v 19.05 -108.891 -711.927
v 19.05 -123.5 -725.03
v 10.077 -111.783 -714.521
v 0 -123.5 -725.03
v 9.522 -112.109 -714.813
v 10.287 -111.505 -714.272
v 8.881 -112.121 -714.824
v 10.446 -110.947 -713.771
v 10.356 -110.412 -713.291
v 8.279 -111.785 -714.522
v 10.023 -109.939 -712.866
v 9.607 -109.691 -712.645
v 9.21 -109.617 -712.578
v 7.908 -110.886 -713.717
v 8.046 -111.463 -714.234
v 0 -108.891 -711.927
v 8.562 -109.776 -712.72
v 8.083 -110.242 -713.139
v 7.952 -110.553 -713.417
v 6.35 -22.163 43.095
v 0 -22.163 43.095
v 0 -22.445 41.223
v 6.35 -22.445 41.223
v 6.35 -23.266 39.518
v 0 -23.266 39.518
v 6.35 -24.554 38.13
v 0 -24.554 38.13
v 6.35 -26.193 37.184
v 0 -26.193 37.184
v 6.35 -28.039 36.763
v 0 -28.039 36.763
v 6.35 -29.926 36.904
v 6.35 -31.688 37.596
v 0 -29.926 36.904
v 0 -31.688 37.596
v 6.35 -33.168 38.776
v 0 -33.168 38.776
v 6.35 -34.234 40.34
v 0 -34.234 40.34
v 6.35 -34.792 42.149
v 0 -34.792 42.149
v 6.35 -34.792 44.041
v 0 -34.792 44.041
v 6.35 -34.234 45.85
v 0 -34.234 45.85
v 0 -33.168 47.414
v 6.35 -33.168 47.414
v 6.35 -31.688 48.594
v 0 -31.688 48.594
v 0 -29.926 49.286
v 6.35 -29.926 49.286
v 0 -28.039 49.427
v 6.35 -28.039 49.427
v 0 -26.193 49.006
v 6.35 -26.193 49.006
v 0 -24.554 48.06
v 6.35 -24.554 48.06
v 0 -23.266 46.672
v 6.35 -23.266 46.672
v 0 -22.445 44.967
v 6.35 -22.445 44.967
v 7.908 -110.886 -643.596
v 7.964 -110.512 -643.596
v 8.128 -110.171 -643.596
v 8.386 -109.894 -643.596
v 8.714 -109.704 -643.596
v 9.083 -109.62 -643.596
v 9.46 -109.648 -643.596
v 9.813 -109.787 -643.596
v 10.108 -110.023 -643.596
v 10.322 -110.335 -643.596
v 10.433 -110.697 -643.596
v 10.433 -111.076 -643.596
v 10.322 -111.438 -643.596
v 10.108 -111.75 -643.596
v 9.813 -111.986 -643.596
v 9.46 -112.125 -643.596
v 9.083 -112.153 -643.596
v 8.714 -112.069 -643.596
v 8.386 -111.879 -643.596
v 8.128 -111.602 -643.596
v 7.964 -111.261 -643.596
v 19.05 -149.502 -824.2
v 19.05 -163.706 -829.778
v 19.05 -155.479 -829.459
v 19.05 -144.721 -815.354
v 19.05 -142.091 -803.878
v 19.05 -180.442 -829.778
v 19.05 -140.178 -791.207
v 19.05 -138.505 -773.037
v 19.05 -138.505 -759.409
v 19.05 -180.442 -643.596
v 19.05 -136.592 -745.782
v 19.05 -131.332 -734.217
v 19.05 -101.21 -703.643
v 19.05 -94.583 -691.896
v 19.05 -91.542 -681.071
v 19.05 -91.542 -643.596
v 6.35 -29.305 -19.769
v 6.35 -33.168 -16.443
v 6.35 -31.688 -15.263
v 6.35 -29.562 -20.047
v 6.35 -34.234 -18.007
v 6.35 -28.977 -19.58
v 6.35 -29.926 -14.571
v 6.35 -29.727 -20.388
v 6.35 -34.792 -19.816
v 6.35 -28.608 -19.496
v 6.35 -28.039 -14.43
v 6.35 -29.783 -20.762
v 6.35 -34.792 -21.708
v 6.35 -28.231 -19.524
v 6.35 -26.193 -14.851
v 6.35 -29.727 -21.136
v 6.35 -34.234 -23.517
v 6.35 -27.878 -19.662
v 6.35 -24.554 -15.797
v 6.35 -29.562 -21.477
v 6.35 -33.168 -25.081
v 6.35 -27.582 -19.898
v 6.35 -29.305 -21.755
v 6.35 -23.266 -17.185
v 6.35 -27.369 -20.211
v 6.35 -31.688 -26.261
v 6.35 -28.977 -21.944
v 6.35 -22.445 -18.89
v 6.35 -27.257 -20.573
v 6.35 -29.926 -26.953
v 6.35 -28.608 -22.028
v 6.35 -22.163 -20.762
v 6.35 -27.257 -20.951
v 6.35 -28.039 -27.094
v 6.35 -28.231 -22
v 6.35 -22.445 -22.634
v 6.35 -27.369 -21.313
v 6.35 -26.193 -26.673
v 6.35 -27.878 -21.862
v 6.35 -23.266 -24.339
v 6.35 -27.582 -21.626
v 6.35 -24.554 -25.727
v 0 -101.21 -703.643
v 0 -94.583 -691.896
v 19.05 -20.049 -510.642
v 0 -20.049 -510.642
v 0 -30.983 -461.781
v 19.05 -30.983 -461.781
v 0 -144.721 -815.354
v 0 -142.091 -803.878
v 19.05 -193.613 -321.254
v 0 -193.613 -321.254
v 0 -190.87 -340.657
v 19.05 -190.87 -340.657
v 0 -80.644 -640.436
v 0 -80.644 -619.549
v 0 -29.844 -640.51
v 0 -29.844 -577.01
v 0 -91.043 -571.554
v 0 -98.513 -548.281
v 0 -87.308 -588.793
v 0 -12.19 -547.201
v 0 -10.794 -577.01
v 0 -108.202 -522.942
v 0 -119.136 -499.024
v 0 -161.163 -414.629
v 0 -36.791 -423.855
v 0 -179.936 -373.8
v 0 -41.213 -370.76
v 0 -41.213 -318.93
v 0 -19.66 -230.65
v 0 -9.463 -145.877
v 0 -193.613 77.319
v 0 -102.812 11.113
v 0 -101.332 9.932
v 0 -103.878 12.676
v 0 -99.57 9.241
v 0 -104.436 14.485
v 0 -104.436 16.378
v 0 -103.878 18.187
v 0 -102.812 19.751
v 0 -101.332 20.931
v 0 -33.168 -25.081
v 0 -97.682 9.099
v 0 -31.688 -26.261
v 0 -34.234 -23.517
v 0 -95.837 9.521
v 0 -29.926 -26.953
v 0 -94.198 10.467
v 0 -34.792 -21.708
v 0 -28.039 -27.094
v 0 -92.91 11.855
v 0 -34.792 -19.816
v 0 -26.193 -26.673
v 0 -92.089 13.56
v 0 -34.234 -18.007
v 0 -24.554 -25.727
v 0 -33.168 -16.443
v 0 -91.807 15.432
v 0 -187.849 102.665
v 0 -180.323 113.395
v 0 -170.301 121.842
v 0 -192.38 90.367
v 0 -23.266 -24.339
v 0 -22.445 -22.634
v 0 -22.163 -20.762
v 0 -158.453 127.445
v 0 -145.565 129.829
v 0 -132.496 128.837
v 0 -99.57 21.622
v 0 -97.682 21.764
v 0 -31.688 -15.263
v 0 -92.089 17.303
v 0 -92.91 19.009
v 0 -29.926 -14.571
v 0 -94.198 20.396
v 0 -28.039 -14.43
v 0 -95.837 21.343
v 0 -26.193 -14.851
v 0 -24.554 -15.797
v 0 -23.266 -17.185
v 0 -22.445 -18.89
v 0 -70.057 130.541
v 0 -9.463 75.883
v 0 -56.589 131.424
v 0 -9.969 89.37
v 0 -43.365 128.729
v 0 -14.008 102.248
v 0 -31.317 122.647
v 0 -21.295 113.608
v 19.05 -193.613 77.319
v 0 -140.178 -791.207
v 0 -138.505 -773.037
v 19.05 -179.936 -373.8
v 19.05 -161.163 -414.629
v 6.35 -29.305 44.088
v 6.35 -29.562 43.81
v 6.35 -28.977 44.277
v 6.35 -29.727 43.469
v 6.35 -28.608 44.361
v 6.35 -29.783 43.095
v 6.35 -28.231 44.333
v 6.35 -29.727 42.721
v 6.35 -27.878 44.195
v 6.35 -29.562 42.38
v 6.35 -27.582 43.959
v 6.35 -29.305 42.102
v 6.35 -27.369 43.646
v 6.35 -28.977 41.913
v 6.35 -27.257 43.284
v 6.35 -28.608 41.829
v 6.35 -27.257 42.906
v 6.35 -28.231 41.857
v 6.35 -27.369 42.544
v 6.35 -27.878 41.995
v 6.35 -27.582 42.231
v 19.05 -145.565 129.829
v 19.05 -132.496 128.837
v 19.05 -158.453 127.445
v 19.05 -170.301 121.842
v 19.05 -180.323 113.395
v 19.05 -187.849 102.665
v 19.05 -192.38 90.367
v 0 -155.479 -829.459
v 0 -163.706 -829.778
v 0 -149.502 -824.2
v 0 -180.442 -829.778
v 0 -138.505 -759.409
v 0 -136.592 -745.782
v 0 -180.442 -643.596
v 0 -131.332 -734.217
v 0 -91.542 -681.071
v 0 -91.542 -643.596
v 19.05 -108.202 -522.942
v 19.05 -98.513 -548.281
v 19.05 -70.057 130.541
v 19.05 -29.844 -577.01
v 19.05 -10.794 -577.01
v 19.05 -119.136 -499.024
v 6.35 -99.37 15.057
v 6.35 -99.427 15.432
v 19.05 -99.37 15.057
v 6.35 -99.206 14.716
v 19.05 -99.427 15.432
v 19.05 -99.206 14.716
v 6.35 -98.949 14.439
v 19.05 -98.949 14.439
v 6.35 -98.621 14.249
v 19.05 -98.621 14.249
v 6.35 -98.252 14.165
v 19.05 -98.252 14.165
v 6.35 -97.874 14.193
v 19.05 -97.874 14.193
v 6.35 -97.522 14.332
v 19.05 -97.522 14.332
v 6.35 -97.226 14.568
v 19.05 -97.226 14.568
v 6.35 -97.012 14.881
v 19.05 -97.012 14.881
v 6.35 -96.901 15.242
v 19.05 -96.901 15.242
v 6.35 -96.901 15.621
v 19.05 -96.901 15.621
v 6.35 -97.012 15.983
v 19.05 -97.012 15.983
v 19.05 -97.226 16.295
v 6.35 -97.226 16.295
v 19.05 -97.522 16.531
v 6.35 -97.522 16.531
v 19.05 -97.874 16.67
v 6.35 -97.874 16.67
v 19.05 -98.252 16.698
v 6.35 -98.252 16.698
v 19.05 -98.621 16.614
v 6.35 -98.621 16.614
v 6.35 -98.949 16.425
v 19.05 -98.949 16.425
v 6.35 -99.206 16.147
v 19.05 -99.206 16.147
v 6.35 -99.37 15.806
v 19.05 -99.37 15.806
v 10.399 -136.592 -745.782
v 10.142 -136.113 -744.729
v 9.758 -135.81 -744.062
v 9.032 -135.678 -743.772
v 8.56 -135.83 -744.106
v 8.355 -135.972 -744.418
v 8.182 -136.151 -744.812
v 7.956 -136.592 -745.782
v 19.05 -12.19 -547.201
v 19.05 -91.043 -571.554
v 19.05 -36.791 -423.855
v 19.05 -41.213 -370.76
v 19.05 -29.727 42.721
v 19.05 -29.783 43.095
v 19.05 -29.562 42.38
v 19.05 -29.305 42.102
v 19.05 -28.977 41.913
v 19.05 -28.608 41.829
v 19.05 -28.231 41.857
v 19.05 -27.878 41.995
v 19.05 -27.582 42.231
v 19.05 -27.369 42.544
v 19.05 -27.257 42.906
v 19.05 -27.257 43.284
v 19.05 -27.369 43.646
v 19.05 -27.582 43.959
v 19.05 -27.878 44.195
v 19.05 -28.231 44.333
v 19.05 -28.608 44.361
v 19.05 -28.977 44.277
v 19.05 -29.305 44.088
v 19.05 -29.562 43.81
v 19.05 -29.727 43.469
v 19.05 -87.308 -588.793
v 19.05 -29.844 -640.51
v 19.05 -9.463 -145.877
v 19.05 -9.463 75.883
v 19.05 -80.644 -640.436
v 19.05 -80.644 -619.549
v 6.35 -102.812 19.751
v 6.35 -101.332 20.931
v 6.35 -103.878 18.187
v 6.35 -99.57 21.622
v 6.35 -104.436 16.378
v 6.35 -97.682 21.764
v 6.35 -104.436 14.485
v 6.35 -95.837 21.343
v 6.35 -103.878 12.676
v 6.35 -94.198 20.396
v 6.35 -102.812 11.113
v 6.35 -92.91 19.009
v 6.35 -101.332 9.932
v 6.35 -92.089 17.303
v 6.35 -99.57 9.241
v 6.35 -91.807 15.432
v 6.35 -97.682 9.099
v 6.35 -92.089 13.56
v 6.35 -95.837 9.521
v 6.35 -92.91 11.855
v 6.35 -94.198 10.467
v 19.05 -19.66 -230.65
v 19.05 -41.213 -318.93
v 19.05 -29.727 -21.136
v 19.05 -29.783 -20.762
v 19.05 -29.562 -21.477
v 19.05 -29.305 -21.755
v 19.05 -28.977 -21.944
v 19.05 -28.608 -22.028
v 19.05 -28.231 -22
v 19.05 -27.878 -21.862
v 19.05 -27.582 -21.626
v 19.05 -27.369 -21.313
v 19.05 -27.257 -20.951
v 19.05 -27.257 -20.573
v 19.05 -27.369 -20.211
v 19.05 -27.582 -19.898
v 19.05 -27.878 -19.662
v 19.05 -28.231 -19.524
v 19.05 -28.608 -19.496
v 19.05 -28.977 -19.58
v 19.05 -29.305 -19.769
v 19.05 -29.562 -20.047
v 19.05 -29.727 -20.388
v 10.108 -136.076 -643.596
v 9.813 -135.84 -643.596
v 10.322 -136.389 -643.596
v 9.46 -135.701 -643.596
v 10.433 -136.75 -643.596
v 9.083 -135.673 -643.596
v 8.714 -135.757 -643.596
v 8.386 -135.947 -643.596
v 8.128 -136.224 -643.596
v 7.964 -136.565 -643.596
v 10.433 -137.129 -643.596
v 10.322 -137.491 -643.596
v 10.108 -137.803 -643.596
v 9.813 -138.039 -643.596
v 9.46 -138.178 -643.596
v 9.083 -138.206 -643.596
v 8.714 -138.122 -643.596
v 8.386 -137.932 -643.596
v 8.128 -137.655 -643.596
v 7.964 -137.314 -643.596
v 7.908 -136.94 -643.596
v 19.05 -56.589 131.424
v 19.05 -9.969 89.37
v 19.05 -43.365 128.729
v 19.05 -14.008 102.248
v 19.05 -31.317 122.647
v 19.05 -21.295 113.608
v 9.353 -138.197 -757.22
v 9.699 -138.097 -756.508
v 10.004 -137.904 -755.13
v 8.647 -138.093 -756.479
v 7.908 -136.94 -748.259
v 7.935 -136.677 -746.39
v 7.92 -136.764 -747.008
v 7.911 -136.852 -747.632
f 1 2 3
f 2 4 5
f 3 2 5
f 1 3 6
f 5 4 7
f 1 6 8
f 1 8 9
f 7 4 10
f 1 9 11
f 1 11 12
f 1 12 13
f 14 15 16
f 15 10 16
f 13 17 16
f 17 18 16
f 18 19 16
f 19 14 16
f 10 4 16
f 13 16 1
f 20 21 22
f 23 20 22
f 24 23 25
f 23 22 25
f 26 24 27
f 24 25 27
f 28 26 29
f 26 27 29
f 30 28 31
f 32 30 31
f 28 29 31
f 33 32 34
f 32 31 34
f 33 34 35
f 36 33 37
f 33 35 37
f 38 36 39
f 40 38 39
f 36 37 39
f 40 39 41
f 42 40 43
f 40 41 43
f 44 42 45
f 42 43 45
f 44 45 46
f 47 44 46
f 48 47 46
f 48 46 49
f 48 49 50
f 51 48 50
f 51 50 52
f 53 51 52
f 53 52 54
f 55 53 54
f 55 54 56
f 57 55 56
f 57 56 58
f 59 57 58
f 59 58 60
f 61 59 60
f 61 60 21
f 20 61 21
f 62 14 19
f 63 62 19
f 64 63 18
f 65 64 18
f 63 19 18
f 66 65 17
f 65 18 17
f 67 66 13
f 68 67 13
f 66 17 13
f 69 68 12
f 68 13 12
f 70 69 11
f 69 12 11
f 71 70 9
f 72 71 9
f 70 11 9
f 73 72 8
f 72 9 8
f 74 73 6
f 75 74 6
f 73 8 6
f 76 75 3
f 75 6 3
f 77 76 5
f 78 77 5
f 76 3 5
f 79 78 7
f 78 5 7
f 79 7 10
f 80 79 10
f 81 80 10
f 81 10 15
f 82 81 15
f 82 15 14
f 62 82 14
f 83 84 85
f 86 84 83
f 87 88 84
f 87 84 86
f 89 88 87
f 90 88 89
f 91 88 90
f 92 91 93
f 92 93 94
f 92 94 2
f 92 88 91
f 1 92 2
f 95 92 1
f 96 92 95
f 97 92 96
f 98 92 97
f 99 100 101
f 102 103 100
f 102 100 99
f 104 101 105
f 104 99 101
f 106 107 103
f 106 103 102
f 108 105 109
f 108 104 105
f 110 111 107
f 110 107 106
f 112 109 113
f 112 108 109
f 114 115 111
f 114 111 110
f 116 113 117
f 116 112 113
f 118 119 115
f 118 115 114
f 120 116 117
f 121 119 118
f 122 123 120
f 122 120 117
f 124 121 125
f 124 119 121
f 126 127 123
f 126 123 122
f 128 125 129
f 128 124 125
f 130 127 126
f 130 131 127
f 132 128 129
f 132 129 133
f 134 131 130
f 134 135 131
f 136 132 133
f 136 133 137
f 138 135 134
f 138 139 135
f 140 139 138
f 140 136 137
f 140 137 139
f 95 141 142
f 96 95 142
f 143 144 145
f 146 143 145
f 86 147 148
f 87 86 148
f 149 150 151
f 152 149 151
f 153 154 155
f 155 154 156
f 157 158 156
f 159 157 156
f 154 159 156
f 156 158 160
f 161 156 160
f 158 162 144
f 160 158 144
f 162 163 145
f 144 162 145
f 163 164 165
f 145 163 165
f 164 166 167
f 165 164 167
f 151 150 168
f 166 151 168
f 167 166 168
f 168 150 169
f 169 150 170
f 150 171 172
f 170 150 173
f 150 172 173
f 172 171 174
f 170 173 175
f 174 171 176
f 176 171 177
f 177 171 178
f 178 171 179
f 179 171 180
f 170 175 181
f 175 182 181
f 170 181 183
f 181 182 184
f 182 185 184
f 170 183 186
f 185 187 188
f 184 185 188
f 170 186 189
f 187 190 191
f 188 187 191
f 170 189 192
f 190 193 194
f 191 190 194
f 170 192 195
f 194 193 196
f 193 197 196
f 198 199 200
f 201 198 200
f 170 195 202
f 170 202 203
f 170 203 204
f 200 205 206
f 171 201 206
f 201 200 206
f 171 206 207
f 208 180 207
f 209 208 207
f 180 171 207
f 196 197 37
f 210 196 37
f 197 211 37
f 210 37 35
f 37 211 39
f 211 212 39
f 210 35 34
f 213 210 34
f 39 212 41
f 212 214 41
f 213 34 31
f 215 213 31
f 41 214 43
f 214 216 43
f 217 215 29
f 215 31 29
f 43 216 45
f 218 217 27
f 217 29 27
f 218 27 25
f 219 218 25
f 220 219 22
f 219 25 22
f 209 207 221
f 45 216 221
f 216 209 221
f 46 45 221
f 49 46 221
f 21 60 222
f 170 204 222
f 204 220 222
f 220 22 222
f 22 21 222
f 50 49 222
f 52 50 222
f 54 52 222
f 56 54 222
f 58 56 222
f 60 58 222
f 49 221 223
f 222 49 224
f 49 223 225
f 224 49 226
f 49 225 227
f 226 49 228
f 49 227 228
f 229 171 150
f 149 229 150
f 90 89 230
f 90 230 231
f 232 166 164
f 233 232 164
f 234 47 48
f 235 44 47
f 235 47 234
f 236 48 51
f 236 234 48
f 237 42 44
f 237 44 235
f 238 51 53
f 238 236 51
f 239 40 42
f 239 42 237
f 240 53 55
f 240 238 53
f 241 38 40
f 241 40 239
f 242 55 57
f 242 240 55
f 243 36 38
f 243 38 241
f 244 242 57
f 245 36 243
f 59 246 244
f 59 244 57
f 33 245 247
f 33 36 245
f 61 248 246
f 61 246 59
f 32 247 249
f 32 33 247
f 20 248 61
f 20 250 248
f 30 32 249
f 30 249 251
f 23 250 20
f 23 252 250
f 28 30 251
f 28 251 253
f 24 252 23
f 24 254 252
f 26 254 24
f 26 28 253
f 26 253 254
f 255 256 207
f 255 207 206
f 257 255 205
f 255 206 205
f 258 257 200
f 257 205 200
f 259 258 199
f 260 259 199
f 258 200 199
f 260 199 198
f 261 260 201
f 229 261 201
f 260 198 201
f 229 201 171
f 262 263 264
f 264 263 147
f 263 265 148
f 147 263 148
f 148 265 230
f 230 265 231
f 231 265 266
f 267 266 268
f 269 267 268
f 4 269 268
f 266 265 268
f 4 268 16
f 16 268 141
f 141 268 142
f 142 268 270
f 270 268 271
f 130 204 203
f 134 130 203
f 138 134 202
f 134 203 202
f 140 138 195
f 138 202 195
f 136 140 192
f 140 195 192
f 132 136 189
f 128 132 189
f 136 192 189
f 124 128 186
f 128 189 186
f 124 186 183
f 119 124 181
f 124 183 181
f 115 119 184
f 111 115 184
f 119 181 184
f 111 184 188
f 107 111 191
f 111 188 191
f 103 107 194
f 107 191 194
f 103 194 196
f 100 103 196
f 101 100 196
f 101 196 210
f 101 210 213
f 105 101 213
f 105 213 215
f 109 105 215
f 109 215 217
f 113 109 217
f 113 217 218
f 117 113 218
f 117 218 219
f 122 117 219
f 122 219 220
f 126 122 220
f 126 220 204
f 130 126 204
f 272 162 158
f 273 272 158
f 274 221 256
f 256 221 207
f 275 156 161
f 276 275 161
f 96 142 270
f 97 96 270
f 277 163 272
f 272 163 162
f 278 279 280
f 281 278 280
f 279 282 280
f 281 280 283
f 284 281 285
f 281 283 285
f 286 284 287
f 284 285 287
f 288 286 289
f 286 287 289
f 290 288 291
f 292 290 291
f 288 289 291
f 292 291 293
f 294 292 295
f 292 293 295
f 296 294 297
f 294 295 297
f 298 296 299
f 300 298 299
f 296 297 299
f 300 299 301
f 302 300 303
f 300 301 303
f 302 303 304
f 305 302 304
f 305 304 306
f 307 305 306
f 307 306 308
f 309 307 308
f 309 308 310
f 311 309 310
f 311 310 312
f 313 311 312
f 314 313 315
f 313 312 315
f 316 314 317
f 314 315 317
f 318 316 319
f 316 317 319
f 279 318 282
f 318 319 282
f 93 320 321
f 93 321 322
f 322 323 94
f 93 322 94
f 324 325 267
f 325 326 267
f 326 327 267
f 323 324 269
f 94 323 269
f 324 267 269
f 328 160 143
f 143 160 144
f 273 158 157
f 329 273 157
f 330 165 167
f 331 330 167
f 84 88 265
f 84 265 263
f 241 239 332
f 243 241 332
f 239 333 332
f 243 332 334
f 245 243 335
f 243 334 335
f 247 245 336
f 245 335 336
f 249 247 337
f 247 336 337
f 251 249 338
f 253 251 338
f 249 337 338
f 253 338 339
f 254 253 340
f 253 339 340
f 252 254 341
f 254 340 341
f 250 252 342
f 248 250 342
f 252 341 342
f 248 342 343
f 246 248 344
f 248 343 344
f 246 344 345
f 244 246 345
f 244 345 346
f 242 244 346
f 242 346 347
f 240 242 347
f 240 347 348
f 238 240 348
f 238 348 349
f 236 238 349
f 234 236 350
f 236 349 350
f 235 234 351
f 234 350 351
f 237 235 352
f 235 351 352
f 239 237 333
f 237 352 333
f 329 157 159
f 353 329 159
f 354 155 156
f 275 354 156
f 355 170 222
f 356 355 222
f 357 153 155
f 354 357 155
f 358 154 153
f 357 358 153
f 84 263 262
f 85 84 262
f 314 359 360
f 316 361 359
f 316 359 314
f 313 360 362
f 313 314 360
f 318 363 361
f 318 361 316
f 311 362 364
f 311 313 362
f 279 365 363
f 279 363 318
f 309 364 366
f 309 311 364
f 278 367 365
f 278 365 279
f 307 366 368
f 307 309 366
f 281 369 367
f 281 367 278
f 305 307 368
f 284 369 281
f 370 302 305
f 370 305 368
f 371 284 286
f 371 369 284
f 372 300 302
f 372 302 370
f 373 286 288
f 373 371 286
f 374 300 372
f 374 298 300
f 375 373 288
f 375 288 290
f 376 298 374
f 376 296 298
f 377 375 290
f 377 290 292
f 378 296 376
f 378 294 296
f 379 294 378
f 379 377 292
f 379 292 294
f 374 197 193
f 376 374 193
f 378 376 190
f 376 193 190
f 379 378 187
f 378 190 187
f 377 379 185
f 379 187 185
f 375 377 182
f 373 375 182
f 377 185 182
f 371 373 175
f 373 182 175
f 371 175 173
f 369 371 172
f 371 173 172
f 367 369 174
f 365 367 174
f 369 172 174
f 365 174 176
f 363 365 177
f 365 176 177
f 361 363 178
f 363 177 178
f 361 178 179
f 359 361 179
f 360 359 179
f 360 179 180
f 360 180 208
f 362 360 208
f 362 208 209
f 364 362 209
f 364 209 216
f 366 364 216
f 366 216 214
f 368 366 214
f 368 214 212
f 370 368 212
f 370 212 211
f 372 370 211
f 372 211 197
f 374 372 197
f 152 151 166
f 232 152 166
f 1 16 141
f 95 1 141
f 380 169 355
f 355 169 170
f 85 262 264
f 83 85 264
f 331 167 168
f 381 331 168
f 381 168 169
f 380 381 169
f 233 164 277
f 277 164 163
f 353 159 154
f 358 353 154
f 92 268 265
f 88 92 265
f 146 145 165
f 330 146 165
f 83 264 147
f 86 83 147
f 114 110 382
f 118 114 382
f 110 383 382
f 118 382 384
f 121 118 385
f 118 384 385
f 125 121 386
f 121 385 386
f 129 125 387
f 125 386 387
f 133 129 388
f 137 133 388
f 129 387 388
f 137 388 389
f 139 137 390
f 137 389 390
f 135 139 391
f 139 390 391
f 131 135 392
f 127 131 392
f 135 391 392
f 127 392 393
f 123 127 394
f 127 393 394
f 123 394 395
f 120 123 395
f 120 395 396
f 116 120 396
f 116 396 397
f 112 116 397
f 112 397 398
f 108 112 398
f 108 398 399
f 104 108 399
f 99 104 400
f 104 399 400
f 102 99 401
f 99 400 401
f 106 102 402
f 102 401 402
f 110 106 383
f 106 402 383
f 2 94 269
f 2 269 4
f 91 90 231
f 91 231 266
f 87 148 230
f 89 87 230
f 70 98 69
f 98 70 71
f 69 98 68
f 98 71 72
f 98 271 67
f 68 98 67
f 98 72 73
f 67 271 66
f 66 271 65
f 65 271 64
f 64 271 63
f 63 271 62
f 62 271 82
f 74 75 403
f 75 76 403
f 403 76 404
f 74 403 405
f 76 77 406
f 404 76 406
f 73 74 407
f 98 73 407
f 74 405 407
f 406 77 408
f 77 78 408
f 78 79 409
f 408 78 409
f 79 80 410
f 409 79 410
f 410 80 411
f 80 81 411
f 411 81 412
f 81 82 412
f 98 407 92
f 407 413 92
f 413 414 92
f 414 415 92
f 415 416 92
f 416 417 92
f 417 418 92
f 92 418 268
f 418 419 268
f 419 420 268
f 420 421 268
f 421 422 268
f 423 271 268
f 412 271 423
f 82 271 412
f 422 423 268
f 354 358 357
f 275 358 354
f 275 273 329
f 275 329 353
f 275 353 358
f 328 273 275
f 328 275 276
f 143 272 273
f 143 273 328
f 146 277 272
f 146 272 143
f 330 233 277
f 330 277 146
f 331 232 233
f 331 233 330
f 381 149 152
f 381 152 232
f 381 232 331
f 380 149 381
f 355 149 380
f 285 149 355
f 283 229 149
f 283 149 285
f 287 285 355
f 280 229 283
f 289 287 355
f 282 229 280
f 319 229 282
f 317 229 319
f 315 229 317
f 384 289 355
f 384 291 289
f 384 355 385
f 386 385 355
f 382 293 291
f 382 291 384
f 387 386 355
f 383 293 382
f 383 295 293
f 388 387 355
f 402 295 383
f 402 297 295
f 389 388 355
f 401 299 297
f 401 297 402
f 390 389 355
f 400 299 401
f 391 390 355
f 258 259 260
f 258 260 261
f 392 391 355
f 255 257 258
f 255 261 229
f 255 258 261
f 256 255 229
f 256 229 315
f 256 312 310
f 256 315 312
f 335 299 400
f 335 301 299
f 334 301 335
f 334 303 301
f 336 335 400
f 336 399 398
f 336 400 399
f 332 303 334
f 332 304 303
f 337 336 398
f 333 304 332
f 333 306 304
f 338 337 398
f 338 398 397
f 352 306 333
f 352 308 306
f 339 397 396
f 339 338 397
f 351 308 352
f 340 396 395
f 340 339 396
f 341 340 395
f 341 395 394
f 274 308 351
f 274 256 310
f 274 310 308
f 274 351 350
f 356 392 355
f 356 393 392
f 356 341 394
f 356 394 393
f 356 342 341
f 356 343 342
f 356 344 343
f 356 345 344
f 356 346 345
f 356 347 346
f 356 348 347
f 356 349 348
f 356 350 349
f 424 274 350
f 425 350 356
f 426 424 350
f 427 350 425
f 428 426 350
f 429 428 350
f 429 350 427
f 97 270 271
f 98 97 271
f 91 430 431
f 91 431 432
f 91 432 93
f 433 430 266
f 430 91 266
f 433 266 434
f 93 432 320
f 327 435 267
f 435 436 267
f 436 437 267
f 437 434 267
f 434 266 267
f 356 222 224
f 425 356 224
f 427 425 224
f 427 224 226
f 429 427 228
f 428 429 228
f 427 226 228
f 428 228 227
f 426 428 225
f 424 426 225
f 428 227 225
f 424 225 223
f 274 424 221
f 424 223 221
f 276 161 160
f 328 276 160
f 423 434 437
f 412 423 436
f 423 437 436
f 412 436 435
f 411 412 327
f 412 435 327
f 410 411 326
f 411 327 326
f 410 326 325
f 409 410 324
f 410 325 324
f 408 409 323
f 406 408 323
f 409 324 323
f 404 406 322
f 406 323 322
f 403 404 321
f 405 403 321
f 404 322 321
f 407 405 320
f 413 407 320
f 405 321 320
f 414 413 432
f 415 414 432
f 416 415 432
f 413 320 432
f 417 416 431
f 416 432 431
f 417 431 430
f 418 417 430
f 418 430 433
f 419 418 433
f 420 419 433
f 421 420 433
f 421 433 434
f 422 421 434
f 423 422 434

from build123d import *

# Parameters (mm, degrees)
F1_DEPTH       = 19.05
F3_DEPTH       = 19.05
F5_D           = 2.54
F6_D           = 2.54
F6_CBORE_D     = 12.7
F6_CBORE_DEPTH = 6.35


with BuildPart() as f1:
    # F0 (on Right) → F1 (new body)
    with BuildSketch(Plane.YZ):
        with BuildLine():
            Line((-9.4631160864, -145.8767226739), (-9.4631160864, 75.883344673))
            ThreePointArc((-9.4631160864, 75.883344673), (-26.0043887413, 118.4617737239), (-70.0568248432, 130.5414754989))
            Line((-70.0568248432, 130.5414754989), (-132.4960702221, 128.8365857415))
            ThreePointArc((-132.4960702221, 128.8365857415), (-175.5855155906, 117.9432591892), (-193.6131160864, 77.3185070558))
            Line((-193.6131160864, 77.3185070558), (-193.6131160864, 12.8251980523))
            Line((-193.6131160864, 12.8251980523), (-193.6131160864, -321.2538063526))
            Line((-193.6131160864, -321.2538063526), (-190.8701509237, -340.6569361687))
            Line((-190.8701509237, -340.6569361687), (-179.9363493919, -373.8000094891))
            Line((-179.9363493919, -373.8000094891), (-161.1630767584, -414.6291613579))
            Line((-161.1630767584, -414.6291613579), (-119.1362962127, -499.024450779))
            Line((-119.1362962127, -499.024450779), (-108.2024946809, -522.9421257973))
            Line((-108.2024946809, -522.9421257973), (-98.5129252076, -548.2812523842))
            Line((-98.5129252076, -548.2812523842), (-91.0426452756, -571.554005146))
            Line((-91.0426452756, -571.554005146), (-87.3075053096, -588.7931585312))
            Line((-87.3075053096, -588.7931585312), (-80.6437532824, -619.5490189172))
            Line((-80.6437532824, -619.5490189172), (-80.6437532824, -619.8235154152))
            Line((-80.6437532824, -619.8235154152), (-80.6437532824, -629.592359066))
            Line((-80.6437532824, -629.592359066), (-80.6437532824, -640.436412161))
            Line((-80.6437532824, -640.436412161), (-29.8438072205, -640.5104398727))
            Line((-29.8438072205, -640.5104398727), (-29.8438072205, -577.0104398727))
            Line((-29.8438072205, -577.0104398727), (-10.7938072205, -577.0104398727))
            Line((-10.7938072205, -577.0104398727), (-12.1900755912, -547.2014546394))
            Line((-12.1900755912, -547.2014546394), (-20.0487431139, -510.6415748596))
            Line((-20.0487431139, -510.6415748596), (-30.9825371951, -461.7811739445))
            Line((-30.9825371951, -461.7811739445), (-36.7911197245, -423.85455966))
            Line((-36.7911197245, -423.85455966), (-41.2131160864, -370.7598916097))
            Line((-41.2131160864, -370.7598916097), (-41.2131160864, -318.930464129))
            Line((-41.2131160864, -318.930464129), (-19.6600593626, -230.6498885155))
            Line((-19.6600593626, -230.6498885155), (-9.4631160864, -145.8767226739))
        make_face()
    extrude(amount=F1_DEPTH)

    # F6 (through all)
    with Locations(Plane(origin=(0, 0, 0), x_dir=(0, 1, 0), z_dir=(-1, 0, 0))):
        with Locations((-28.5131160864, 20.7620505524), (-28.5131160864, -43.0949992777), (-98.1566741219, -15.4316150452)):
            CounterBoreHole(F6_D / 2, F6_CBORE_D / 2, F6_CBORE_DEPTH)


with BuildPart() as f3:
    # F2 (on Right) → F3 (new body)
    with BuildSketch(Plane.YZ):
        Polygon((-91.5418712854, -681.0708045959), (-91.5418712854, -643.5962540321), (-180.4418712854, -643.5962540321), (-180.4418712854, -829.7782540321), (-163.7063026428, -829.7782540321), (-155.4791927338, -829.4594287872), (-149.5022177696, -824.1996765137), (-144.7206288576, -815.3537511826), (-142.0907527208, -803.8779497147), (-140.1781141758, -791.2067174911), (-138.5045647621, -773.0367183685), (-138.5045647621, -759.4091892242), (-136.5919262171, -745.78166008), (-131.3321888447, -734.2174053192), (-123.5004365444, -725.0301241875), (-108.8912039995, -711.9269967079), (-101.210065186, -703.6434412003), (-94.5831984282, -691.8957829475), align=None)
    extrude(amount=F3_DEPTH)

    # F5 (through all)
    with Locations(Plane.XY.offset(-643.5962540321)):
        with Locations((9.1775171459, -136.9395554066), (9.1775171459, -110.8864918351)):
            Hole(F5_D / 2)


solid = Compound([f1.part, f3.part])
